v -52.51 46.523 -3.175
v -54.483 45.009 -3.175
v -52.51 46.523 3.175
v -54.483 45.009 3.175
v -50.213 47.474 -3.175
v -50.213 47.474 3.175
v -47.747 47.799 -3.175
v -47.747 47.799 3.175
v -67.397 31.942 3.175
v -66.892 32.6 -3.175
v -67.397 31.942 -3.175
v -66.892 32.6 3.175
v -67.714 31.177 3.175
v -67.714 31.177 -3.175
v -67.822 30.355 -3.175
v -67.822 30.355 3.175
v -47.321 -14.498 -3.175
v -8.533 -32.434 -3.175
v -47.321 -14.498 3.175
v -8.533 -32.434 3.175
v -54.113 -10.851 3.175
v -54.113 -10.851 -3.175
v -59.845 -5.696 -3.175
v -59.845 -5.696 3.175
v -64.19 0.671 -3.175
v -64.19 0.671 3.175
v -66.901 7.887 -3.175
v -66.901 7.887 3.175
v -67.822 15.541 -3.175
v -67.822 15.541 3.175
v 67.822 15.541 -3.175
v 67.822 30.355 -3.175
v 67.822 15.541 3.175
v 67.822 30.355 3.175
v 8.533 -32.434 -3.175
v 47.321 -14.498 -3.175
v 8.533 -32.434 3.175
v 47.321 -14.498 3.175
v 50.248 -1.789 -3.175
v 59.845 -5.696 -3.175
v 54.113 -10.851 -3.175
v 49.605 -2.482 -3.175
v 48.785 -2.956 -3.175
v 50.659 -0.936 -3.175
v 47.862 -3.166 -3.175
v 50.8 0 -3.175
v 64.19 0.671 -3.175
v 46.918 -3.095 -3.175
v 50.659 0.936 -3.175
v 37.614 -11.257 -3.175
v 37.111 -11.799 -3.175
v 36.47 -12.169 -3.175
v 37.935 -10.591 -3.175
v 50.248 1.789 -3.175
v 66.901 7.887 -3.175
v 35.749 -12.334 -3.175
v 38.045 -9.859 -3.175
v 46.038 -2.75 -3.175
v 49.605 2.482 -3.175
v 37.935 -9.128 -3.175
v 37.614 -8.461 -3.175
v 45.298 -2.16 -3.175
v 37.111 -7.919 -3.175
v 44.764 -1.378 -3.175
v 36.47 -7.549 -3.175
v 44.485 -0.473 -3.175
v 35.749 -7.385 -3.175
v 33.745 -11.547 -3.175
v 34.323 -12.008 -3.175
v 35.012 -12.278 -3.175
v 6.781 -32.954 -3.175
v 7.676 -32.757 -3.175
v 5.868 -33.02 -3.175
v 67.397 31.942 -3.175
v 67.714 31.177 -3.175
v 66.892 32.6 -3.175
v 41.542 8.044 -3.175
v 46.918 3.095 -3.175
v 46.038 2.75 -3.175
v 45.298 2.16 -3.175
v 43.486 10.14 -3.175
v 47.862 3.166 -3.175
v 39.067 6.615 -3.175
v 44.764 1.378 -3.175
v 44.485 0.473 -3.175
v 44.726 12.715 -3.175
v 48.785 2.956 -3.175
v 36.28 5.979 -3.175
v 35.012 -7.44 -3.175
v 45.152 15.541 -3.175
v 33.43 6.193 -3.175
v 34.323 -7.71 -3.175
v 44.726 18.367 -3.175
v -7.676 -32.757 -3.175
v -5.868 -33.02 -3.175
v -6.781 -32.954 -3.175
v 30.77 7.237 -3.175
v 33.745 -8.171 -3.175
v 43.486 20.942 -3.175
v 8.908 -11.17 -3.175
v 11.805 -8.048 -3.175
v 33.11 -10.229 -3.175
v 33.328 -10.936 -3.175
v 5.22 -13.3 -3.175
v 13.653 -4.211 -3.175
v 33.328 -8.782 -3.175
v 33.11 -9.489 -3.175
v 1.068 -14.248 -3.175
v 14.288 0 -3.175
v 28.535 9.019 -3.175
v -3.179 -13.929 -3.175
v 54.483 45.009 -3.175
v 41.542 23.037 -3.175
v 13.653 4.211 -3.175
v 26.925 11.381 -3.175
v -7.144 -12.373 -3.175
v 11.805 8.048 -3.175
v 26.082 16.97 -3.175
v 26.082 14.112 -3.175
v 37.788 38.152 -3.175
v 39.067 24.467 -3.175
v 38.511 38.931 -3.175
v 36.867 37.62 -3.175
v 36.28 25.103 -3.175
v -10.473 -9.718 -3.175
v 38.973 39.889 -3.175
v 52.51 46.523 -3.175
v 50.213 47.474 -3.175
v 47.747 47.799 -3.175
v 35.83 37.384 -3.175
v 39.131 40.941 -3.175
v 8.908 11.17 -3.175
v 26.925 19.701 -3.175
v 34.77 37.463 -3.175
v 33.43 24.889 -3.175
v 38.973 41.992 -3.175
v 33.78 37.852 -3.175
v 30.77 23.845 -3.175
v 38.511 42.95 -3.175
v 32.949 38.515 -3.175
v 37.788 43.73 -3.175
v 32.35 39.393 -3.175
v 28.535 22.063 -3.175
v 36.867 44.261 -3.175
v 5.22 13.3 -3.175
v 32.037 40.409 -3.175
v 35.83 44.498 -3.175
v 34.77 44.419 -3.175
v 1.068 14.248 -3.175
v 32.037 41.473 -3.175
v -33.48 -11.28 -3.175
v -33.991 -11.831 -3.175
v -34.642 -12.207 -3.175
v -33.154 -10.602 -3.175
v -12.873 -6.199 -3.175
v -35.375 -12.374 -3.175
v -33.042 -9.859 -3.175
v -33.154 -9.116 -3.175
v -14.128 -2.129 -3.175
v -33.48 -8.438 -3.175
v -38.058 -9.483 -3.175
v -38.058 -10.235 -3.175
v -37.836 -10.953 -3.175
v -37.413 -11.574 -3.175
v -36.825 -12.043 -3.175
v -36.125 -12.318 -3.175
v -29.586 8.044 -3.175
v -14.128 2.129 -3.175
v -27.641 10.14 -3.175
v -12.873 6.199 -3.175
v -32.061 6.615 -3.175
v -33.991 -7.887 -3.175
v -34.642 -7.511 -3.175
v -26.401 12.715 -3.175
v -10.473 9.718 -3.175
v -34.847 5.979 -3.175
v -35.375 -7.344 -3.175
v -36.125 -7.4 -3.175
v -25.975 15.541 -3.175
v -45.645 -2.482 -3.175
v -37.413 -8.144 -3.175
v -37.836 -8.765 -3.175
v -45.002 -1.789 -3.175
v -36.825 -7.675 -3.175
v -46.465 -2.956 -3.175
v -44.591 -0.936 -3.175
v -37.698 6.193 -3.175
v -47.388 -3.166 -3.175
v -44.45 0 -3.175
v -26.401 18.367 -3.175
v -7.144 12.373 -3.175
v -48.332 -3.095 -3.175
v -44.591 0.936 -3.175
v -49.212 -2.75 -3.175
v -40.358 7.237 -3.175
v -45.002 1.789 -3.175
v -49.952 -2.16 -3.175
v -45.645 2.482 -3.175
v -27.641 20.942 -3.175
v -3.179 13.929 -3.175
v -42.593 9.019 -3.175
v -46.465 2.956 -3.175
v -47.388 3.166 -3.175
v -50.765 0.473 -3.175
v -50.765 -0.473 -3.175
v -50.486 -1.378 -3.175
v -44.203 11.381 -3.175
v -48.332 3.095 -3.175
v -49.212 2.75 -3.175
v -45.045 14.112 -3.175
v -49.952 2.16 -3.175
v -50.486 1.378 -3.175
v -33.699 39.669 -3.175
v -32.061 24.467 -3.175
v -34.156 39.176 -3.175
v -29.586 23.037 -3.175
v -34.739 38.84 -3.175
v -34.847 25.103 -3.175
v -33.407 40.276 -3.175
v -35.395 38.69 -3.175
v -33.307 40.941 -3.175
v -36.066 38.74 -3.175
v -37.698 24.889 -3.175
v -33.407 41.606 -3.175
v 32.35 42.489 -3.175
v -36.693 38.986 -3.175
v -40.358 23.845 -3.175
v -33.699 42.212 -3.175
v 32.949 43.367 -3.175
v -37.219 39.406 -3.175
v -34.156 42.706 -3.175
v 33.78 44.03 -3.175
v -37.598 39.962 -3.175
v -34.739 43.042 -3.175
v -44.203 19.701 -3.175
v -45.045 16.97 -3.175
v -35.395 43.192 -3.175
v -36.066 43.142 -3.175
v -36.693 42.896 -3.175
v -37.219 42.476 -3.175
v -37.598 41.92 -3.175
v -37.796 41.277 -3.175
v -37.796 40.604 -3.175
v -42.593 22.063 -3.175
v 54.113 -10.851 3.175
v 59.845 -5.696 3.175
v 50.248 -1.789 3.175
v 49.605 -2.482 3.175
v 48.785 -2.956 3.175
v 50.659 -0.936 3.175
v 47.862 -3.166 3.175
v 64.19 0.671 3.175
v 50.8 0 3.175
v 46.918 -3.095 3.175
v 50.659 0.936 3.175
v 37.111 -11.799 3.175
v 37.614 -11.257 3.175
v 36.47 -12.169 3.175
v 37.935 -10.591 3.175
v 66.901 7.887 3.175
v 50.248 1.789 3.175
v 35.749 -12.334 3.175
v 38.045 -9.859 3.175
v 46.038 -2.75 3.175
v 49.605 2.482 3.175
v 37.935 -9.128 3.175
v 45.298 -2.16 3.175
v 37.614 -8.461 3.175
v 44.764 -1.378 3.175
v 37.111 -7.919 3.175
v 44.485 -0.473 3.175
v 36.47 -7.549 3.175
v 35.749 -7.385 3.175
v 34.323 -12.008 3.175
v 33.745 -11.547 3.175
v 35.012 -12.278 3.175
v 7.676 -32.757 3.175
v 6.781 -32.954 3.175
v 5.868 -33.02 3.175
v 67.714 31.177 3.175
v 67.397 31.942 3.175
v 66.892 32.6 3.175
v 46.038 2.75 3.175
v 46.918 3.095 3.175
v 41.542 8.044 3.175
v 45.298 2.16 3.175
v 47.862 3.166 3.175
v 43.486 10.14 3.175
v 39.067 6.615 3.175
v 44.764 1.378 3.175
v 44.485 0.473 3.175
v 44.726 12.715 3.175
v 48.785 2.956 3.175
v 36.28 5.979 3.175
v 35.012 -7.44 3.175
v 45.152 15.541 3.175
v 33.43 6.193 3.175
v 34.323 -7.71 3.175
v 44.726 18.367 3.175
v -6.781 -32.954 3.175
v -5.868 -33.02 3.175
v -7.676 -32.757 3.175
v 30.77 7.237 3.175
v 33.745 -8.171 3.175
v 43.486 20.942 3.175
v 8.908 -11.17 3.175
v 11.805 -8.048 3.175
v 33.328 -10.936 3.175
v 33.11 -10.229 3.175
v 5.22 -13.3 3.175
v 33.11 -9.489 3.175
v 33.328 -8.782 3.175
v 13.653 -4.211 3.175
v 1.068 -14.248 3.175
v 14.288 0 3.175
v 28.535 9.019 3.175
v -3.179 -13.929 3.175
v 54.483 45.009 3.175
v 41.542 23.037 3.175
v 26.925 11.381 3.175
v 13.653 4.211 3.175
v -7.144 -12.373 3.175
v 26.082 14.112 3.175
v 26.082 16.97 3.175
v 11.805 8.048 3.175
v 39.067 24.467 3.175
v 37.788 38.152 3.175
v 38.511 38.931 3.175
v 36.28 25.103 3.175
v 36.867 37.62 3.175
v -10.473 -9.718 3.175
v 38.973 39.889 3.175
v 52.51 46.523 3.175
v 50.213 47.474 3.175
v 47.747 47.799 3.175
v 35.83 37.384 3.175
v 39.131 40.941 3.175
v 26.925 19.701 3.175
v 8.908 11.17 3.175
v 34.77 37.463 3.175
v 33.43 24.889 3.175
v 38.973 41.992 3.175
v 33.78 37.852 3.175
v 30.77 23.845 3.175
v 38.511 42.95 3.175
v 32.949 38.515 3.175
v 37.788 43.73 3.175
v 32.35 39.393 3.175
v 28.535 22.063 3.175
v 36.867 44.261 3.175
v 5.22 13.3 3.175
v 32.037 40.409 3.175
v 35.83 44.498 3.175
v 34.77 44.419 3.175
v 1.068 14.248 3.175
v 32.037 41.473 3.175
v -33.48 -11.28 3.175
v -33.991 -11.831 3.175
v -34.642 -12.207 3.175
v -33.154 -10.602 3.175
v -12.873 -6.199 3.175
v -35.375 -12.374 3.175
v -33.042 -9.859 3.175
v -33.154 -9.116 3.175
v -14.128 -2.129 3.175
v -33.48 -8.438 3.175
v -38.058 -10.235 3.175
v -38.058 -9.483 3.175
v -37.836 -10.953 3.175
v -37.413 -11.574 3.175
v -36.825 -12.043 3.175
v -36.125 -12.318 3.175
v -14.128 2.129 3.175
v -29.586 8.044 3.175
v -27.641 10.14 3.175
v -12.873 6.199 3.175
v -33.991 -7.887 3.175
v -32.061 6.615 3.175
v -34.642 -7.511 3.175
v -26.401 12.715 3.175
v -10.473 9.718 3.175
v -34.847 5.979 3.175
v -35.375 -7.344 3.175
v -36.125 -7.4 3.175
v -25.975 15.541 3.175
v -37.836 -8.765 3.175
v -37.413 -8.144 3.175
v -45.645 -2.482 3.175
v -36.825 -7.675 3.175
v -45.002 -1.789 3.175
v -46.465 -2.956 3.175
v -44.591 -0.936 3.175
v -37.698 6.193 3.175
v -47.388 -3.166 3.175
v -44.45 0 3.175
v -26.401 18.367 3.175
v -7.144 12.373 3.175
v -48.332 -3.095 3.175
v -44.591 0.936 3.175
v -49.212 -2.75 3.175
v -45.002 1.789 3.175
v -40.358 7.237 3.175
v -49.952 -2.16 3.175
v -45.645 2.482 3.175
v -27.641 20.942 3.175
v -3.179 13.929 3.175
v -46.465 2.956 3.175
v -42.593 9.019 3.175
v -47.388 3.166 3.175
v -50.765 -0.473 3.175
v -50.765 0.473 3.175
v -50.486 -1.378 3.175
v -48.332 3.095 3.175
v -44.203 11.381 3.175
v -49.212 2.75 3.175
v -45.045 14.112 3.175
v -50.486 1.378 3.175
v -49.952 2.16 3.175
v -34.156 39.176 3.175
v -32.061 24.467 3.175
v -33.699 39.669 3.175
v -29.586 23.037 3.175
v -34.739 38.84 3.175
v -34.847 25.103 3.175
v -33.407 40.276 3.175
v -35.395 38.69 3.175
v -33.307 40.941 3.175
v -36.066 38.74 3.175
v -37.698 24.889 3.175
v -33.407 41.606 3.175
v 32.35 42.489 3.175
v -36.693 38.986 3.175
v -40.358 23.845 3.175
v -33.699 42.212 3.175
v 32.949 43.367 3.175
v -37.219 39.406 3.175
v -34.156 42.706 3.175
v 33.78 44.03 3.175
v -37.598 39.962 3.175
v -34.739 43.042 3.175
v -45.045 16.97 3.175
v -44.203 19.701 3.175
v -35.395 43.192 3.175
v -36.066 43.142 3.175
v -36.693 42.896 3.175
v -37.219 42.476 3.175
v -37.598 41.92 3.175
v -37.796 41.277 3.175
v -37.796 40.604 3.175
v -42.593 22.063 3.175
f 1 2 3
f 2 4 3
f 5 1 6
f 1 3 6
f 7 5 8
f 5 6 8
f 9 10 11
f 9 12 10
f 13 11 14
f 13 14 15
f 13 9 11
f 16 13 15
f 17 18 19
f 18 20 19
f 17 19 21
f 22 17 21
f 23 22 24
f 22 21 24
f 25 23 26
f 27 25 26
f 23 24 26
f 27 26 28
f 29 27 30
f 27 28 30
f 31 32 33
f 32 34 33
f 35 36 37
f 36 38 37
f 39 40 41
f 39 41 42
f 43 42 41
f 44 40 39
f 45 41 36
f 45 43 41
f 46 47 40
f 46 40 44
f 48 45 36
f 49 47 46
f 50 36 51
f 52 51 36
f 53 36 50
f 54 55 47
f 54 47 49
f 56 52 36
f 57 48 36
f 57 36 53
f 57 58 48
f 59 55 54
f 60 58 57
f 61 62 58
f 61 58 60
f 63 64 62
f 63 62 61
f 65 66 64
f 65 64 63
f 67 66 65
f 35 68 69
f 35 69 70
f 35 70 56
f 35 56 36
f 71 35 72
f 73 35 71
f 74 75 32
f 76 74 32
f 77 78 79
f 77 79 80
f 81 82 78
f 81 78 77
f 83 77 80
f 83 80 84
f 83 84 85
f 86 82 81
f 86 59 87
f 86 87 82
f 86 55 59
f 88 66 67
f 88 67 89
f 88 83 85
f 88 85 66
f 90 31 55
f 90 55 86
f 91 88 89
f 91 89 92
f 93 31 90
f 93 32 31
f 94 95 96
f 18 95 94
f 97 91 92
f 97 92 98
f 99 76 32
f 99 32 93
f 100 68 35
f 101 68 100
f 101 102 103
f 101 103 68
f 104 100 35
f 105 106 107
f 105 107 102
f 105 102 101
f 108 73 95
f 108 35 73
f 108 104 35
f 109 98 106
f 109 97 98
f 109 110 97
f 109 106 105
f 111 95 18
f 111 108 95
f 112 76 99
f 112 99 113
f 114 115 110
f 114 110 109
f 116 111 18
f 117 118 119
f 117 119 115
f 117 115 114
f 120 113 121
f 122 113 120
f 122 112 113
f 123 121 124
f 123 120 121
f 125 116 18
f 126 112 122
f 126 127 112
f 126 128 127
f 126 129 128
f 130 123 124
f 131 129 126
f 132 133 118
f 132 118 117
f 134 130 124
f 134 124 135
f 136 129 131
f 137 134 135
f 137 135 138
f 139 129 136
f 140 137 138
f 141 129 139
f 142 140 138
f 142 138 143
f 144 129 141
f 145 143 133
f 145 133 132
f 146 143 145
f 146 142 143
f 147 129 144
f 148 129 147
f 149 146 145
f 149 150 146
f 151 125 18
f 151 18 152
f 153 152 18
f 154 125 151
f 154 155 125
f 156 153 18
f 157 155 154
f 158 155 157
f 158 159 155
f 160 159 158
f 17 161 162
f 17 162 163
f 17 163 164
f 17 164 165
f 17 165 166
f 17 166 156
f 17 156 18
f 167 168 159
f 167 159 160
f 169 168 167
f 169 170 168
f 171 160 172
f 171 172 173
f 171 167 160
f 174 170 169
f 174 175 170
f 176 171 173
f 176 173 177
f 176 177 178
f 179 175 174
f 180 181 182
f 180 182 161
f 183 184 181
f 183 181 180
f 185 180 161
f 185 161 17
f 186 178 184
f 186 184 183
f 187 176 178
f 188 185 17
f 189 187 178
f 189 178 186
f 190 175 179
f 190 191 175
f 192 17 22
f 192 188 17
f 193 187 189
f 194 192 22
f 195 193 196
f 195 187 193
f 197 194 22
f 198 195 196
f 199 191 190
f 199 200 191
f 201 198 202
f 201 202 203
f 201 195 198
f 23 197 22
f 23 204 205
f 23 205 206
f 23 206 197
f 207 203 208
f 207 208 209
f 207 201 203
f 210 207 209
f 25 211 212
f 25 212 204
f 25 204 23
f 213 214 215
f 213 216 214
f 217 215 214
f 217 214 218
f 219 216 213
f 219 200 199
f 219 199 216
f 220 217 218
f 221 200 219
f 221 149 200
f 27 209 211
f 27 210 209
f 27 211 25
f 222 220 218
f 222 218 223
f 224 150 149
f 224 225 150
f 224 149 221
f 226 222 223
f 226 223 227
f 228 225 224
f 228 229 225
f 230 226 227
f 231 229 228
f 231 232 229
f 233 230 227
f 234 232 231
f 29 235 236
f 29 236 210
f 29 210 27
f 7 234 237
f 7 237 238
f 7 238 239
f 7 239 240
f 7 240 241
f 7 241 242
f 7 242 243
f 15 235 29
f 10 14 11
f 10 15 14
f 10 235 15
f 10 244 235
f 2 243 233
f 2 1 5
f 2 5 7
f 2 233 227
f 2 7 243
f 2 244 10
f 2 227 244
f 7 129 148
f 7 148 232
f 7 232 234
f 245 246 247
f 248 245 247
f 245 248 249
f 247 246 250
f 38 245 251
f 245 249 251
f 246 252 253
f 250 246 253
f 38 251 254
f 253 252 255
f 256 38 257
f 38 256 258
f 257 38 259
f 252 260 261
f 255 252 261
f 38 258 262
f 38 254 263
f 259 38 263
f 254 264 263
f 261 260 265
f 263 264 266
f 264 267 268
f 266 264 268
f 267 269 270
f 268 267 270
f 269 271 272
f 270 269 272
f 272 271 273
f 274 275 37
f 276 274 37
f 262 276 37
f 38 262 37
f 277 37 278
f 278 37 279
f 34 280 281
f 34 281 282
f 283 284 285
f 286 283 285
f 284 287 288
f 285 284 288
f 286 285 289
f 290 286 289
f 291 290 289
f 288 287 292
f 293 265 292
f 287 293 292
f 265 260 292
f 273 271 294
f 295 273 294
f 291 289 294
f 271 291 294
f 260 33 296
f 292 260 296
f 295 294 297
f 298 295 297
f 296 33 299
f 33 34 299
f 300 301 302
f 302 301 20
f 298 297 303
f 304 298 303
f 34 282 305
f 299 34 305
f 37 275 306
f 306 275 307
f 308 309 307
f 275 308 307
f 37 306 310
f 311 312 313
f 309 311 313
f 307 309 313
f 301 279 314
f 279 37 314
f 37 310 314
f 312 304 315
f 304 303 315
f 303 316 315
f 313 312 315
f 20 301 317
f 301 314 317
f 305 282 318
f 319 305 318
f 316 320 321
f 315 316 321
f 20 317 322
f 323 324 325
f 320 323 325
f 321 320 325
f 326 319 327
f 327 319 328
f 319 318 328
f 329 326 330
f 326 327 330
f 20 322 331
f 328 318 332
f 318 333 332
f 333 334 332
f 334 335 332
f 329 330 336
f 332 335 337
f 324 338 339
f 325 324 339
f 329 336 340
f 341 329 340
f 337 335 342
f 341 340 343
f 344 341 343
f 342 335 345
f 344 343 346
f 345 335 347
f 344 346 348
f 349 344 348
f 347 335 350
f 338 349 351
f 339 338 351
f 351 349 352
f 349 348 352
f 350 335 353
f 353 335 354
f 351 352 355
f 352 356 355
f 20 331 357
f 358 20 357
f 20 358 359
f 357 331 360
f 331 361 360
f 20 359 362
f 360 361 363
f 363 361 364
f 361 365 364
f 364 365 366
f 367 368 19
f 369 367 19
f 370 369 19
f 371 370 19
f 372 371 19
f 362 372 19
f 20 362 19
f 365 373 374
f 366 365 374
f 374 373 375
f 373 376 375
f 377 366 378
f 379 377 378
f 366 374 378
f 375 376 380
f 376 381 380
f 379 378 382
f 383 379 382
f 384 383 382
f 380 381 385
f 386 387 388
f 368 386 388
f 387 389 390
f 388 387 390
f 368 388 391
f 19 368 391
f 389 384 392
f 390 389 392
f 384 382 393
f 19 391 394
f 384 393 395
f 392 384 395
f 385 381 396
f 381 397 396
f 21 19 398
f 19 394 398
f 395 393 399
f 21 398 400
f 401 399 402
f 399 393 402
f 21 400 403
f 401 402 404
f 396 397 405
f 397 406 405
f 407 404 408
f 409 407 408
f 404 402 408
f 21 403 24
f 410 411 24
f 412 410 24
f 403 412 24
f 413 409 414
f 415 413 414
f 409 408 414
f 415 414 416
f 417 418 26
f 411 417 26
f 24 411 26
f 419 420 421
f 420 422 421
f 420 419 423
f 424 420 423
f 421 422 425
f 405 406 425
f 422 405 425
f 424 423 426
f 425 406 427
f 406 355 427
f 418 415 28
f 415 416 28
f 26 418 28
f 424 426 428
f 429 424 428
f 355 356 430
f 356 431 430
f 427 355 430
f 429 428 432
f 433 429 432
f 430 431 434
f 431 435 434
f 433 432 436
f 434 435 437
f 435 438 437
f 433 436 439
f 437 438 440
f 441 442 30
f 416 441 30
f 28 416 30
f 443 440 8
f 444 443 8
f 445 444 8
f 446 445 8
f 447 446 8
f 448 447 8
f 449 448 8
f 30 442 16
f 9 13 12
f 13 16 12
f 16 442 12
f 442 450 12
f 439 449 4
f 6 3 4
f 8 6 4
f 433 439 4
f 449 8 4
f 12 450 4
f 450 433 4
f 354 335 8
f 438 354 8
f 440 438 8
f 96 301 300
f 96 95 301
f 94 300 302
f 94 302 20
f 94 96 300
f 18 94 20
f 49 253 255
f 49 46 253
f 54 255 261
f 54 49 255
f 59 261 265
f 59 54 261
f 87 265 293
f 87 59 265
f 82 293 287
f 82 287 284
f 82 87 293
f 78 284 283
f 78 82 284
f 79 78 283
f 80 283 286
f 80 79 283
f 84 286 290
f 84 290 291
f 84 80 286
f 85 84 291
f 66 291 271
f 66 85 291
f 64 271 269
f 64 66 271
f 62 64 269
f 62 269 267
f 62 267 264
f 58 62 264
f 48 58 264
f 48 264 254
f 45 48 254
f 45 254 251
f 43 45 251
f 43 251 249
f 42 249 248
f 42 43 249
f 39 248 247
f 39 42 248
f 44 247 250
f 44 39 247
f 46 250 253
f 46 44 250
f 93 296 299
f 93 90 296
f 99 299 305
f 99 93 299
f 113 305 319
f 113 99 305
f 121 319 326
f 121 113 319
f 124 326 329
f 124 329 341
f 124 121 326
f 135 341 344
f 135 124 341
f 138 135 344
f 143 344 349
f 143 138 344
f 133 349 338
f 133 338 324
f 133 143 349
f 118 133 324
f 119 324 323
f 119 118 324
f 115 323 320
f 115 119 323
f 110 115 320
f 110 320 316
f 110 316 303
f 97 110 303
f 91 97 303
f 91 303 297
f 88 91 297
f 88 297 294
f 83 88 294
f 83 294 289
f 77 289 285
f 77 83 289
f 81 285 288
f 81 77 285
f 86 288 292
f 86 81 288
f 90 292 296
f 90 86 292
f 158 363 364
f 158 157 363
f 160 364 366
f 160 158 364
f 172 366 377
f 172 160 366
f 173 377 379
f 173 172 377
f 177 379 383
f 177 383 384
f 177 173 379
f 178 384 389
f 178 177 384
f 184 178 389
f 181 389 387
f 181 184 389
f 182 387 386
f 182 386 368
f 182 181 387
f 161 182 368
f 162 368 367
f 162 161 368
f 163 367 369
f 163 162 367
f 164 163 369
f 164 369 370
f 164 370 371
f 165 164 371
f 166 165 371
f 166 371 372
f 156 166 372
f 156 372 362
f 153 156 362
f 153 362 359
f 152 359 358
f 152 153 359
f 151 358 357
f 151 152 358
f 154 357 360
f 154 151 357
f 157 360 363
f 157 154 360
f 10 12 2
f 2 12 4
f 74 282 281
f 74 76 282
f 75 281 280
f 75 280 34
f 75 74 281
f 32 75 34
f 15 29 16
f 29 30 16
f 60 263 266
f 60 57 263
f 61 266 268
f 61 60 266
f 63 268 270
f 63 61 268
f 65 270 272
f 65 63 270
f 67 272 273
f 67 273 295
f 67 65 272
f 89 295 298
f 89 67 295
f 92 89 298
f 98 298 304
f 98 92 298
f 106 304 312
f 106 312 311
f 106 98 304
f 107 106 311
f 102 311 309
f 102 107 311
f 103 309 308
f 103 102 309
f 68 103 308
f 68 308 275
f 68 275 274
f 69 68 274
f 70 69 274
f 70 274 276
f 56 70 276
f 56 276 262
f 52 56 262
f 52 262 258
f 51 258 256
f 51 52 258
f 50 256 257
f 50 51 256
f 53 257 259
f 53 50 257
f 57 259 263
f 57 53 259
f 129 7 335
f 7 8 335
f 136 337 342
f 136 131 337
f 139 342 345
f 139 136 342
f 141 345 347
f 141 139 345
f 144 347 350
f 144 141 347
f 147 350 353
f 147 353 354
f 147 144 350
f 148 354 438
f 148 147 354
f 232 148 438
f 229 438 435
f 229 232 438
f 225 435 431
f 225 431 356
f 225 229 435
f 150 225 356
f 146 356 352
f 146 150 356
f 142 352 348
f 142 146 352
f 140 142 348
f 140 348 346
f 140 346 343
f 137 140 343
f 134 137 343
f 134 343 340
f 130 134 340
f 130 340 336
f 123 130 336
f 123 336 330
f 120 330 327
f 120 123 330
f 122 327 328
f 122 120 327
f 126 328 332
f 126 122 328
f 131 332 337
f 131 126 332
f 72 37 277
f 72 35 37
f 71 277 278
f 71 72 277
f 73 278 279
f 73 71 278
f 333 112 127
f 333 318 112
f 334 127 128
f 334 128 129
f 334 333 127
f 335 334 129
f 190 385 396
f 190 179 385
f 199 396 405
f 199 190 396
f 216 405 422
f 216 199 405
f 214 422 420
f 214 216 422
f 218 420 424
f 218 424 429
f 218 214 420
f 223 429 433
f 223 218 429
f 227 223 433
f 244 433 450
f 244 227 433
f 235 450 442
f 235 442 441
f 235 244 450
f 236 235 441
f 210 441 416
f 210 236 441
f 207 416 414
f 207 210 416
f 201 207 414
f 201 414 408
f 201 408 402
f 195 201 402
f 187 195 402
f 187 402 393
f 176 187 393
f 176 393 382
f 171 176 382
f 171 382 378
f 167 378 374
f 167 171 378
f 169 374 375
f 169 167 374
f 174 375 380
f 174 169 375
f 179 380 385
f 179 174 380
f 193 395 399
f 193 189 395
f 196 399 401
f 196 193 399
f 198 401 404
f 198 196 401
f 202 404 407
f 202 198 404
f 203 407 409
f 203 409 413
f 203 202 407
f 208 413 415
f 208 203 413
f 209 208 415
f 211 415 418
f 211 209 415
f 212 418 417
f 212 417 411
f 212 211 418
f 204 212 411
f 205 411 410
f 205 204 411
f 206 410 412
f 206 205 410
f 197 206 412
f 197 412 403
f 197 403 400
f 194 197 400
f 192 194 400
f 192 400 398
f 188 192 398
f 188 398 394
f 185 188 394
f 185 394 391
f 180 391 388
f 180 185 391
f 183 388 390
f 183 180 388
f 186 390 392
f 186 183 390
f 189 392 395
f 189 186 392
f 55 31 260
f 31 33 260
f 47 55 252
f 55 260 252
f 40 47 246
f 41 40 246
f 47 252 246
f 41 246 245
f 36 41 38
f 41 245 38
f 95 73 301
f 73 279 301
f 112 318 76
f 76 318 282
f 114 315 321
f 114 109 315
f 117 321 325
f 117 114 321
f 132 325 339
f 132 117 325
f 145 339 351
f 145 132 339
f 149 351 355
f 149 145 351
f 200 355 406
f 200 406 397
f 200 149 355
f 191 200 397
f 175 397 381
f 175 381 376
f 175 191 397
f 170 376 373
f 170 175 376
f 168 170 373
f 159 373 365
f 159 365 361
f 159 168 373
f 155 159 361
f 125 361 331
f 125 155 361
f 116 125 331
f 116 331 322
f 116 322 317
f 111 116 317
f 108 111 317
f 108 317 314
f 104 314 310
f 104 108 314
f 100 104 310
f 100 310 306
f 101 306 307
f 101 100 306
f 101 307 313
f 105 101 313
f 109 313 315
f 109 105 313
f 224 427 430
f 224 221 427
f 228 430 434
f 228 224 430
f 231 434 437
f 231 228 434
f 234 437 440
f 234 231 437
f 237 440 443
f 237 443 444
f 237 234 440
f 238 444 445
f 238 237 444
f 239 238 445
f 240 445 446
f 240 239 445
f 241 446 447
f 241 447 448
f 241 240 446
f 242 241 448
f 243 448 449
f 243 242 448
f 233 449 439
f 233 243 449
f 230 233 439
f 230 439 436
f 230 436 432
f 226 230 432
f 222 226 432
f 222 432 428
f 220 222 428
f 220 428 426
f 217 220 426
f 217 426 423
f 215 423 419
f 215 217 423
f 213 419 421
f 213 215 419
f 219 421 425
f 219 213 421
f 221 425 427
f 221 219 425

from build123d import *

# Parameters (mm, degrees)
SKETCH1_R           = 14.2875
SKETCH1_R_2         = 9.5885
SKETCH1_R_3         = 3.175
SKETCH1_R_4         = 2.257278931
SKETCH1_R_5         = 2.521989484
SKETCH1_R_6         = 2.481468777
SKETCH1_R_7         = 3.567111366
BOSS_EXTRUDE1_DEPTH = 3.175
FILLET1_R           = 9.525
FILLET2_R           = 3.175
FILLET3_R           = 6.35


with BuildPart() as part:
    # Sketch1 → Boss-Extrude1 (new, symmetric)
    with BuildSketch(Plane.XY):
        with BuildLine():
            Line((-35.563882813, 47.798897166), (35.563882813, 47.798897166))
            Line((35.563882813, 47.798897166), (51.692882813, 47.798897166))
            Line((51.692882813, 47.798897166), (67.821882813, 31.669897166))
            Line((67.821882813, 31.669897166), (67.821882813, 15.540897166))
            ThreePointArc((67.821882813, 15.540897166), (62.208310766, -2.642969943), (47.321354383, -14.498084612))
            Line((47.321354383, -14.498084612), (7.26457678, -33.02))
            Line((7.26457678, -33.02), (-7.26457678, -33.02))
            Line((-7.26457678, -33.02), (-47.321354383, -14.498084612))
            ThreePointArc((-47.321354383, -14.498084612), (-62.208310766, -2.642969943), (-67.821882813, 15.540897166))
            Line((-67.821882813, 15.540897166), (-67.821882813, 31.669897166))
            Line((-67.821882813, 31.669897166), (-51.692882813, 47.798897166))
            Line((-51.692882813, 47.798897166), (-35.563882813, 47.798897166))
        make_face()
        Circle(SKETCH1_R, mode=Mode.SUBTRACT)
        with Locations((35.563882813, 15.540897166)):
            Circle(SKETCH1_R_2, mode=Mode.SUBTRACT)
        with Locations((-35.563882813, 15.540897166)):
            Circle(SKETCH1_R_2, mode=Mode.SUBTRACT)
        with Locations((-47.625, 0)):
            Circle(SKETCH1_R_3, mode=Mode.SUBTRACT)
        with Locations((47.625, 0)):
            Circle(SKETCH1_R_3, mode=Mode.SUBTRACT)
        with Locations((-35.563882813, 40.940897166)):
            Circle(SKETCH1_R_4, mode=Mode.SUBTRACT)
        with Locations((-35.563882813, -9.859102834)):
            Circle(SKETCH1_R_5, mode=Mode.SUBTRACT)
        with Locations((35.563882813, -9.859102834)):
            Circle(SKETCH1_R_6, mode=Mode.SUBTRACT)
        with Locations((35.563882813, 40.940897166)):
            Circle(SKETCH1_R_7, mode=Mode.SUBTRACT)
    extrude(amount=BOSS_EXTRUDE1_DEPTH, both=True)

    # Fillet1
    fillet1_edges = [part.edges().sort_by_distance(p)[0] for p in [
        (51.692882813, 47.798897166, 0),
        (-51.692882813, 47.798897166, 0),
    ]]
    fillet(fillet1_edges, radius=FILLET1_R)

    # Fillet2
    fillet2_edges = [part.edges().sort_by_distance(p)[0] for p in [
        (67.821882813, 31.669897166, 0),
        (-67.821882813, 31.669897166, 0),
    ]]
    fillet(fillet2_edges, radius=FILLET2_R)

    # Fillet3
    fillet3_edges = [part.edges().sort_by_distance(p)[0] for p in [
        (7.26457678, -33.02, 0),
        (-7.26457678, -33.02, 0),
    ]]
    fillet(fillet3_edges, radius=FILLET3_R)


solid = part.part
